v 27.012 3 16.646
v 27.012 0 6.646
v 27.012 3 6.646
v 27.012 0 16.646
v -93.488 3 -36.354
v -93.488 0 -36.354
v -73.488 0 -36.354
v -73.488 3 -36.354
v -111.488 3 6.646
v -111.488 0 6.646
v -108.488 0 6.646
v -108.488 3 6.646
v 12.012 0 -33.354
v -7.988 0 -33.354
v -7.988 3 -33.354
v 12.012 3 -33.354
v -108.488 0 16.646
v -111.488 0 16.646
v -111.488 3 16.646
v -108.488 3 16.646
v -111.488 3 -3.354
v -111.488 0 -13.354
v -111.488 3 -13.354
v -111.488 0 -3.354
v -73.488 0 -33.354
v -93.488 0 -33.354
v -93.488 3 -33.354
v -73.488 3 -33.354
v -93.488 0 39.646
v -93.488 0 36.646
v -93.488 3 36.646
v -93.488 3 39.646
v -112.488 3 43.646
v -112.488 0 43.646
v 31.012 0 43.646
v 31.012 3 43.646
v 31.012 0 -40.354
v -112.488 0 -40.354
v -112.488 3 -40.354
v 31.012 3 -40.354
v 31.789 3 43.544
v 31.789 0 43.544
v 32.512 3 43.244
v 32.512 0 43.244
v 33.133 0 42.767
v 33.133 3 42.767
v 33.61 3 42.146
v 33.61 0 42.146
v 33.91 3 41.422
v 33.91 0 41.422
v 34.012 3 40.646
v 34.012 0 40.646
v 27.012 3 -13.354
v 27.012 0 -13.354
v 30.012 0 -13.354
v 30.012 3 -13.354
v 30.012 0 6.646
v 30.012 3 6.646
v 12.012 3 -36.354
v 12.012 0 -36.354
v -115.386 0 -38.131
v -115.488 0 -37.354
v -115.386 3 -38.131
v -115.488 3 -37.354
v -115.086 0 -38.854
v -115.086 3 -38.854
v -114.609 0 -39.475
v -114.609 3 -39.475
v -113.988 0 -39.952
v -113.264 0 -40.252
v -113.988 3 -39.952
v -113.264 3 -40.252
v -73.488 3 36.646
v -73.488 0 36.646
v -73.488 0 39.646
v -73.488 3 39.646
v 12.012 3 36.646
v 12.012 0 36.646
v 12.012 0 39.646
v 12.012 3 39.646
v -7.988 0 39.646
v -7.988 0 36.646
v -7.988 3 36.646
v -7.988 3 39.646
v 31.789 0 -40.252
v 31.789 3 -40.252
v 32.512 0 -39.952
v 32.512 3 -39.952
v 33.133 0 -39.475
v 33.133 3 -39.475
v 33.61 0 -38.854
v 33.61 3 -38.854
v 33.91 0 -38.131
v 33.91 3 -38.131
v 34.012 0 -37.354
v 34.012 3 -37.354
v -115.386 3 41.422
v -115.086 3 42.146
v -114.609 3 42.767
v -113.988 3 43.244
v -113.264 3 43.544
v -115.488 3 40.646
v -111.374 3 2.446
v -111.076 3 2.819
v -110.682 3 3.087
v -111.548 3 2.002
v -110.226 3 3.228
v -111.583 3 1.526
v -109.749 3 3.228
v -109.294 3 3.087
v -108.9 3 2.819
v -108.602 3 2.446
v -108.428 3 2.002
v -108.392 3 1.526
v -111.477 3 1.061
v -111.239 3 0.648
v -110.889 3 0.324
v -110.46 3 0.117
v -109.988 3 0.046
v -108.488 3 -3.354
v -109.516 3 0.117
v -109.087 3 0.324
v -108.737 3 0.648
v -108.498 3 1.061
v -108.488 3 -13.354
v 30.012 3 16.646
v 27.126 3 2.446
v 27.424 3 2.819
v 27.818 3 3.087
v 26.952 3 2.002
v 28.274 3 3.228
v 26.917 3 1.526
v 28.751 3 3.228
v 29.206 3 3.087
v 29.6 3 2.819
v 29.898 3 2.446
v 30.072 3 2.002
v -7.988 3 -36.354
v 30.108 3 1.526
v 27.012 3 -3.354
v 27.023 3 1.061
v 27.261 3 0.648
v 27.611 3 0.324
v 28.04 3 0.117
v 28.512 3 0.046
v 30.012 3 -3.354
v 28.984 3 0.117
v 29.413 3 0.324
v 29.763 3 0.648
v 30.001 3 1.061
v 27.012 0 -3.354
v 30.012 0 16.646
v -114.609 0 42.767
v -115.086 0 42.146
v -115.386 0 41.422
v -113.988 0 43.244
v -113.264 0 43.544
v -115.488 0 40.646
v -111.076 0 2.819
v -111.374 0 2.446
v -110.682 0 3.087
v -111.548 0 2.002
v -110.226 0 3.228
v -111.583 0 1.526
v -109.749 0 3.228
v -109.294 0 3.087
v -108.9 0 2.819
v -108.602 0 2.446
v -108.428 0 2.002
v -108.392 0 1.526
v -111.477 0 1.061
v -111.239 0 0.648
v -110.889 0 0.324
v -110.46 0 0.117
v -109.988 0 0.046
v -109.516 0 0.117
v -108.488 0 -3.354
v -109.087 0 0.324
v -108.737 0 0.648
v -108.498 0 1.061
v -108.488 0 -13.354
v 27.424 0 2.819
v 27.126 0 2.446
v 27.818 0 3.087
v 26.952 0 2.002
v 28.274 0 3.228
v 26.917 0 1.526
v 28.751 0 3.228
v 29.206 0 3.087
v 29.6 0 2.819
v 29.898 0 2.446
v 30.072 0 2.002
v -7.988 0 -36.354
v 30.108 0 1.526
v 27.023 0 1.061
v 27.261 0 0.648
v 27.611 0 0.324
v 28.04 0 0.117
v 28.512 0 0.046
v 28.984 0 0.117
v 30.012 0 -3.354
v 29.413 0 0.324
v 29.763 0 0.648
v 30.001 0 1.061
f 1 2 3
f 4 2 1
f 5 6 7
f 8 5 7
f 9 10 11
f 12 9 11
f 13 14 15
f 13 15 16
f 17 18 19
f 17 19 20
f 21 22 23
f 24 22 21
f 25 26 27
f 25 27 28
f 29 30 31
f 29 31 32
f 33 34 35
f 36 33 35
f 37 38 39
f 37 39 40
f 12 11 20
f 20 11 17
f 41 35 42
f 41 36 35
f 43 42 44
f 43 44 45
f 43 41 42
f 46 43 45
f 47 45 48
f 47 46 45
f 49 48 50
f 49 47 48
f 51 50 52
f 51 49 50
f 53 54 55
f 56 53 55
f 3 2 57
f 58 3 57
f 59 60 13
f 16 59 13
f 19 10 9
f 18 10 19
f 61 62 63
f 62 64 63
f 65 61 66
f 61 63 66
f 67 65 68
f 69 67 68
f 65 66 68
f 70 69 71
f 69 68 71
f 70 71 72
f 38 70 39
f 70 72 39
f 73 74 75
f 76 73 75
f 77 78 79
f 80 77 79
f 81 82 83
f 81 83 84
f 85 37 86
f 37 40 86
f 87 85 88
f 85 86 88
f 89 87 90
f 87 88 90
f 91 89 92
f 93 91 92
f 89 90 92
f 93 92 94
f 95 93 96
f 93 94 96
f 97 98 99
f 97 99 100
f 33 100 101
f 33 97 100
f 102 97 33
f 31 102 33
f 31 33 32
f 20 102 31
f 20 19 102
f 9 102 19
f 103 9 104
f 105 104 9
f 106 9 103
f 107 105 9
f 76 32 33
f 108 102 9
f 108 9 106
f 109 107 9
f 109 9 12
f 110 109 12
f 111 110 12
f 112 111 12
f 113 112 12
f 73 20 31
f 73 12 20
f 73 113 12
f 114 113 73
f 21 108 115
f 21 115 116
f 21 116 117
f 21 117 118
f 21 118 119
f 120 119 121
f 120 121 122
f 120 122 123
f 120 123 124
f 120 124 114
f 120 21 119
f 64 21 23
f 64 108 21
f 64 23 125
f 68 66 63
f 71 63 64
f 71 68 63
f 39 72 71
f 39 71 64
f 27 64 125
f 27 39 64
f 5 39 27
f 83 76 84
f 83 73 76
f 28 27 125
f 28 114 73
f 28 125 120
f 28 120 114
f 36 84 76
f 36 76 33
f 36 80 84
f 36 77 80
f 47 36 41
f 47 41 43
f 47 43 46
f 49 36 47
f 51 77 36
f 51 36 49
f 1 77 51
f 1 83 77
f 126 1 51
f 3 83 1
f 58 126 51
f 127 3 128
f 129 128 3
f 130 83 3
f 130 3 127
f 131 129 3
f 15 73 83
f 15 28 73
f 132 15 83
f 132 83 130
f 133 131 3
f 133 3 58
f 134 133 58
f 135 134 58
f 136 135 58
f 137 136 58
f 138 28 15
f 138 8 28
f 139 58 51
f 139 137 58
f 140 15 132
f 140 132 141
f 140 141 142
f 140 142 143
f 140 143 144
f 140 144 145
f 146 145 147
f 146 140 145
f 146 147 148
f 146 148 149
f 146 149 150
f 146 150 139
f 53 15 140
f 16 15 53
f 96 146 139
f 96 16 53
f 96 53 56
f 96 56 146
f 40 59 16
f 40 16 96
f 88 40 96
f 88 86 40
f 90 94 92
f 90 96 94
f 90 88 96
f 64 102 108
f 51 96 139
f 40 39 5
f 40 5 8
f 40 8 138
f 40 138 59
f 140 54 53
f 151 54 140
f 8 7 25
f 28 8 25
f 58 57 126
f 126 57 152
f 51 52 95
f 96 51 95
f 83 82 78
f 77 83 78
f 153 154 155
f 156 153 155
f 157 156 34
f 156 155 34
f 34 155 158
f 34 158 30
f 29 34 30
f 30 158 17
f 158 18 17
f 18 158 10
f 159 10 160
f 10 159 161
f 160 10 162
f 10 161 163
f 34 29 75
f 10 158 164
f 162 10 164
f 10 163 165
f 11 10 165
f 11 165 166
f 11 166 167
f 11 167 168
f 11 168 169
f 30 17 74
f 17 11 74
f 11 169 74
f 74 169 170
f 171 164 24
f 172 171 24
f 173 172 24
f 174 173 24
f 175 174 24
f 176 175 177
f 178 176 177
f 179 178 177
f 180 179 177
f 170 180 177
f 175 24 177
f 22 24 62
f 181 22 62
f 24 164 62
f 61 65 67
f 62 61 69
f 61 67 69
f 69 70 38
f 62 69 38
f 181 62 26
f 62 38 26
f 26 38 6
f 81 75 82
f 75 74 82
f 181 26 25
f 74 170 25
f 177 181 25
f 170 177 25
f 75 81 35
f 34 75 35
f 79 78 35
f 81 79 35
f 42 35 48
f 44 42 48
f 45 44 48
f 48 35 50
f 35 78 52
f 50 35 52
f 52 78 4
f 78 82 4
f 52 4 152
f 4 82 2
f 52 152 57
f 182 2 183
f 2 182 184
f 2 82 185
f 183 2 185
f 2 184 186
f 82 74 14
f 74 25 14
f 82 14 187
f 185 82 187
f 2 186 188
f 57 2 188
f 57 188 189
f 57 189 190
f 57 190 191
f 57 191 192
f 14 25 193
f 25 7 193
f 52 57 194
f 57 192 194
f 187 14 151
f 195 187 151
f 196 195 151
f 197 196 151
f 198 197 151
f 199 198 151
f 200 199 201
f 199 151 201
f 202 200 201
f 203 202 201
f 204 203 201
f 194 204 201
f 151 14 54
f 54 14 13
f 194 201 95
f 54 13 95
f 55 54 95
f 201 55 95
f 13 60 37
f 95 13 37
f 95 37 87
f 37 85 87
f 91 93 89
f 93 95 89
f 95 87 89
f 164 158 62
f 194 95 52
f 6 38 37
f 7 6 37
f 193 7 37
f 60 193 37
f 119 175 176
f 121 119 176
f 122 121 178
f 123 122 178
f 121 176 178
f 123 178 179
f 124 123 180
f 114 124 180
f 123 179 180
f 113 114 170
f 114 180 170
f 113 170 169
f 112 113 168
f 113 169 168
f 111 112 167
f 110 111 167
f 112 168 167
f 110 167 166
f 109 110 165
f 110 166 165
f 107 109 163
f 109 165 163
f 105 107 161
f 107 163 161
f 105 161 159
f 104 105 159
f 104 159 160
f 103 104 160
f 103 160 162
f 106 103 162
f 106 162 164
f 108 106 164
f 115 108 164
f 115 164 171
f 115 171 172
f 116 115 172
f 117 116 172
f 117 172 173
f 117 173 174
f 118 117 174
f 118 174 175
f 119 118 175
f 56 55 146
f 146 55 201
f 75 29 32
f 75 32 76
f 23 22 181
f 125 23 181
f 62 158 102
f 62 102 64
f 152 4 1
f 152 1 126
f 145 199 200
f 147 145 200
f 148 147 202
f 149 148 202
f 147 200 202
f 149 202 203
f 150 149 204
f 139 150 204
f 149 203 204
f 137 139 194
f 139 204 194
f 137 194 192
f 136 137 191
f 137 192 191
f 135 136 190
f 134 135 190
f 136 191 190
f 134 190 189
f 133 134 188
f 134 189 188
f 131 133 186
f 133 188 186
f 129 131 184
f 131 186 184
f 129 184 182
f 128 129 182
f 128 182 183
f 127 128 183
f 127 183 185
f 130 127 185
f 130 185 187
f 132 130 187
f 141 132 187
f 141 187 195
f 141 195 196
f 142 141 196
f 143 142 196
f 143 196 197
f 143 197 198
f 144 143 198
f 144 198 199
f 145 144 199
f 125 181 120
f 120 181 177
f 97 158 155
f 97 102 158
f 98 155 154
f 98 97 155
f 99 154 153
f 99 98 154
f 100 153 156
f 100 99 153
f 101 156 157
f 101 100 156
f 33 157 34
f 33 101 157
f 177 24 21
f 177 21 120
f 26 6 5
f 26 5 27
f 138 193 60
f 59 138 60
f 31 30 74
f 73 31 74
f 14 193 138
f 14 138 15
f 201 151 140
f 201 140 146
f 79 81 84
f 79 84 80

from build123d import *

# Parameters (mm, degrees)
SKETCH1_W           = 149.499999434
SKETCH1_H           = 84
BOSS_EXTRUDE1_DEPTH = 3
SKETCH2_W           = 20
SKETCH2_H           = 3
SKETCH2_W_2         = 3
SKETCH2_H_2         = 10
CUT_EXTRUDE1_DEPTH  = 124.496635409
SKETCH3_R           = 1.6
CUT_EXTRUDE2_DEPTH  = 124.496635409
FILLET1_R           = 3


with BuildPart() as part:
    # Sketch1 → Boss-Extrude1 (new body)
    with BuildSketch(Plane(origin=(0, 0, 0), x_dir=(1, 0, 0), z_dir=(0, 1, 0))):
        with Locations((-40.737898115, -1.645897993)):
            Rectangle(SKETCH1_W, SKETCH1_H)
    extrude(amount=BOSS_EXTRUDE1_DEPTH)

    # Sketch2 → Cut-Extrude1 (cut, through all)
    with BuildSketch(Plane.XZ):
        with Locations((2.012101602, -34.854102007)):
            Rectangle(SKETCH2_W, SKETCH2_H)
        with Locations((-83.487897832, -34.854102007)):
            Rectangle(SKETCH2_W, SKETCH2_H)
        with Locations((-83.487897832, 38.145897993)):
            Rectangle(SKETCH2_W, SKETCH2_H)
        with Locations((2.012101602, 38.145897993)):
            Rectangle(SKETCH2_W, SKETCH2_H)
        with Locations((-109.987897832, 11.645897993)):
            Rectangle(SKETCH2_W_2, SKETCH2_H_2)
        with Locations((-109.987897832, -8.354102007)):
            Rectangle(SKETCH2_W_2, SKETCH2_H_2)
        with Locations((28.512101602, 11.645897993)):
            Rectangle(SKETCH2_W_2, SKETCH2_H_2)
        with Locations((28.512101602, -8.354102007)):
            Rectangle(SKETCH2_W_2, SKETCH2_H_2)
    extrude(amount=-CUT_EXTRUDE1_DEPTH, mode=Mode.SUBTRACT)

    # Sketch3 → Cut-Extrude2 (cut, through all)
    with BuildSketch(Plane.XZ):
        with Locations(Location((28.512101602, 1.645897993, 0), (0, 0, 270))):
            Circle(SKETCH3_R)
        with Locations(Location((-109.987897832, 1.645897993, 0), (0, 0, 270))):
            Circle(SKETCH3_R)
    extrude(amount=-CUT_EXTRUDE2_DEPTH, mode=Mode.SUBTRACT)

    # Fillet1
    fillet1_edges = [part.edges().sort_by_distance(p)[0] for p in [
        (-115.487897832, 1.5, -40.354102007),
        (34.012101602, 1.5, -40.354102007),
        (34.012101602, 1.5, 43.645897993),
        (-115.487897832, 1.5, 43.645897993),
    ]]
    fillet(fillet1_edges, radius=FILLET1_R)


solid = part.part
